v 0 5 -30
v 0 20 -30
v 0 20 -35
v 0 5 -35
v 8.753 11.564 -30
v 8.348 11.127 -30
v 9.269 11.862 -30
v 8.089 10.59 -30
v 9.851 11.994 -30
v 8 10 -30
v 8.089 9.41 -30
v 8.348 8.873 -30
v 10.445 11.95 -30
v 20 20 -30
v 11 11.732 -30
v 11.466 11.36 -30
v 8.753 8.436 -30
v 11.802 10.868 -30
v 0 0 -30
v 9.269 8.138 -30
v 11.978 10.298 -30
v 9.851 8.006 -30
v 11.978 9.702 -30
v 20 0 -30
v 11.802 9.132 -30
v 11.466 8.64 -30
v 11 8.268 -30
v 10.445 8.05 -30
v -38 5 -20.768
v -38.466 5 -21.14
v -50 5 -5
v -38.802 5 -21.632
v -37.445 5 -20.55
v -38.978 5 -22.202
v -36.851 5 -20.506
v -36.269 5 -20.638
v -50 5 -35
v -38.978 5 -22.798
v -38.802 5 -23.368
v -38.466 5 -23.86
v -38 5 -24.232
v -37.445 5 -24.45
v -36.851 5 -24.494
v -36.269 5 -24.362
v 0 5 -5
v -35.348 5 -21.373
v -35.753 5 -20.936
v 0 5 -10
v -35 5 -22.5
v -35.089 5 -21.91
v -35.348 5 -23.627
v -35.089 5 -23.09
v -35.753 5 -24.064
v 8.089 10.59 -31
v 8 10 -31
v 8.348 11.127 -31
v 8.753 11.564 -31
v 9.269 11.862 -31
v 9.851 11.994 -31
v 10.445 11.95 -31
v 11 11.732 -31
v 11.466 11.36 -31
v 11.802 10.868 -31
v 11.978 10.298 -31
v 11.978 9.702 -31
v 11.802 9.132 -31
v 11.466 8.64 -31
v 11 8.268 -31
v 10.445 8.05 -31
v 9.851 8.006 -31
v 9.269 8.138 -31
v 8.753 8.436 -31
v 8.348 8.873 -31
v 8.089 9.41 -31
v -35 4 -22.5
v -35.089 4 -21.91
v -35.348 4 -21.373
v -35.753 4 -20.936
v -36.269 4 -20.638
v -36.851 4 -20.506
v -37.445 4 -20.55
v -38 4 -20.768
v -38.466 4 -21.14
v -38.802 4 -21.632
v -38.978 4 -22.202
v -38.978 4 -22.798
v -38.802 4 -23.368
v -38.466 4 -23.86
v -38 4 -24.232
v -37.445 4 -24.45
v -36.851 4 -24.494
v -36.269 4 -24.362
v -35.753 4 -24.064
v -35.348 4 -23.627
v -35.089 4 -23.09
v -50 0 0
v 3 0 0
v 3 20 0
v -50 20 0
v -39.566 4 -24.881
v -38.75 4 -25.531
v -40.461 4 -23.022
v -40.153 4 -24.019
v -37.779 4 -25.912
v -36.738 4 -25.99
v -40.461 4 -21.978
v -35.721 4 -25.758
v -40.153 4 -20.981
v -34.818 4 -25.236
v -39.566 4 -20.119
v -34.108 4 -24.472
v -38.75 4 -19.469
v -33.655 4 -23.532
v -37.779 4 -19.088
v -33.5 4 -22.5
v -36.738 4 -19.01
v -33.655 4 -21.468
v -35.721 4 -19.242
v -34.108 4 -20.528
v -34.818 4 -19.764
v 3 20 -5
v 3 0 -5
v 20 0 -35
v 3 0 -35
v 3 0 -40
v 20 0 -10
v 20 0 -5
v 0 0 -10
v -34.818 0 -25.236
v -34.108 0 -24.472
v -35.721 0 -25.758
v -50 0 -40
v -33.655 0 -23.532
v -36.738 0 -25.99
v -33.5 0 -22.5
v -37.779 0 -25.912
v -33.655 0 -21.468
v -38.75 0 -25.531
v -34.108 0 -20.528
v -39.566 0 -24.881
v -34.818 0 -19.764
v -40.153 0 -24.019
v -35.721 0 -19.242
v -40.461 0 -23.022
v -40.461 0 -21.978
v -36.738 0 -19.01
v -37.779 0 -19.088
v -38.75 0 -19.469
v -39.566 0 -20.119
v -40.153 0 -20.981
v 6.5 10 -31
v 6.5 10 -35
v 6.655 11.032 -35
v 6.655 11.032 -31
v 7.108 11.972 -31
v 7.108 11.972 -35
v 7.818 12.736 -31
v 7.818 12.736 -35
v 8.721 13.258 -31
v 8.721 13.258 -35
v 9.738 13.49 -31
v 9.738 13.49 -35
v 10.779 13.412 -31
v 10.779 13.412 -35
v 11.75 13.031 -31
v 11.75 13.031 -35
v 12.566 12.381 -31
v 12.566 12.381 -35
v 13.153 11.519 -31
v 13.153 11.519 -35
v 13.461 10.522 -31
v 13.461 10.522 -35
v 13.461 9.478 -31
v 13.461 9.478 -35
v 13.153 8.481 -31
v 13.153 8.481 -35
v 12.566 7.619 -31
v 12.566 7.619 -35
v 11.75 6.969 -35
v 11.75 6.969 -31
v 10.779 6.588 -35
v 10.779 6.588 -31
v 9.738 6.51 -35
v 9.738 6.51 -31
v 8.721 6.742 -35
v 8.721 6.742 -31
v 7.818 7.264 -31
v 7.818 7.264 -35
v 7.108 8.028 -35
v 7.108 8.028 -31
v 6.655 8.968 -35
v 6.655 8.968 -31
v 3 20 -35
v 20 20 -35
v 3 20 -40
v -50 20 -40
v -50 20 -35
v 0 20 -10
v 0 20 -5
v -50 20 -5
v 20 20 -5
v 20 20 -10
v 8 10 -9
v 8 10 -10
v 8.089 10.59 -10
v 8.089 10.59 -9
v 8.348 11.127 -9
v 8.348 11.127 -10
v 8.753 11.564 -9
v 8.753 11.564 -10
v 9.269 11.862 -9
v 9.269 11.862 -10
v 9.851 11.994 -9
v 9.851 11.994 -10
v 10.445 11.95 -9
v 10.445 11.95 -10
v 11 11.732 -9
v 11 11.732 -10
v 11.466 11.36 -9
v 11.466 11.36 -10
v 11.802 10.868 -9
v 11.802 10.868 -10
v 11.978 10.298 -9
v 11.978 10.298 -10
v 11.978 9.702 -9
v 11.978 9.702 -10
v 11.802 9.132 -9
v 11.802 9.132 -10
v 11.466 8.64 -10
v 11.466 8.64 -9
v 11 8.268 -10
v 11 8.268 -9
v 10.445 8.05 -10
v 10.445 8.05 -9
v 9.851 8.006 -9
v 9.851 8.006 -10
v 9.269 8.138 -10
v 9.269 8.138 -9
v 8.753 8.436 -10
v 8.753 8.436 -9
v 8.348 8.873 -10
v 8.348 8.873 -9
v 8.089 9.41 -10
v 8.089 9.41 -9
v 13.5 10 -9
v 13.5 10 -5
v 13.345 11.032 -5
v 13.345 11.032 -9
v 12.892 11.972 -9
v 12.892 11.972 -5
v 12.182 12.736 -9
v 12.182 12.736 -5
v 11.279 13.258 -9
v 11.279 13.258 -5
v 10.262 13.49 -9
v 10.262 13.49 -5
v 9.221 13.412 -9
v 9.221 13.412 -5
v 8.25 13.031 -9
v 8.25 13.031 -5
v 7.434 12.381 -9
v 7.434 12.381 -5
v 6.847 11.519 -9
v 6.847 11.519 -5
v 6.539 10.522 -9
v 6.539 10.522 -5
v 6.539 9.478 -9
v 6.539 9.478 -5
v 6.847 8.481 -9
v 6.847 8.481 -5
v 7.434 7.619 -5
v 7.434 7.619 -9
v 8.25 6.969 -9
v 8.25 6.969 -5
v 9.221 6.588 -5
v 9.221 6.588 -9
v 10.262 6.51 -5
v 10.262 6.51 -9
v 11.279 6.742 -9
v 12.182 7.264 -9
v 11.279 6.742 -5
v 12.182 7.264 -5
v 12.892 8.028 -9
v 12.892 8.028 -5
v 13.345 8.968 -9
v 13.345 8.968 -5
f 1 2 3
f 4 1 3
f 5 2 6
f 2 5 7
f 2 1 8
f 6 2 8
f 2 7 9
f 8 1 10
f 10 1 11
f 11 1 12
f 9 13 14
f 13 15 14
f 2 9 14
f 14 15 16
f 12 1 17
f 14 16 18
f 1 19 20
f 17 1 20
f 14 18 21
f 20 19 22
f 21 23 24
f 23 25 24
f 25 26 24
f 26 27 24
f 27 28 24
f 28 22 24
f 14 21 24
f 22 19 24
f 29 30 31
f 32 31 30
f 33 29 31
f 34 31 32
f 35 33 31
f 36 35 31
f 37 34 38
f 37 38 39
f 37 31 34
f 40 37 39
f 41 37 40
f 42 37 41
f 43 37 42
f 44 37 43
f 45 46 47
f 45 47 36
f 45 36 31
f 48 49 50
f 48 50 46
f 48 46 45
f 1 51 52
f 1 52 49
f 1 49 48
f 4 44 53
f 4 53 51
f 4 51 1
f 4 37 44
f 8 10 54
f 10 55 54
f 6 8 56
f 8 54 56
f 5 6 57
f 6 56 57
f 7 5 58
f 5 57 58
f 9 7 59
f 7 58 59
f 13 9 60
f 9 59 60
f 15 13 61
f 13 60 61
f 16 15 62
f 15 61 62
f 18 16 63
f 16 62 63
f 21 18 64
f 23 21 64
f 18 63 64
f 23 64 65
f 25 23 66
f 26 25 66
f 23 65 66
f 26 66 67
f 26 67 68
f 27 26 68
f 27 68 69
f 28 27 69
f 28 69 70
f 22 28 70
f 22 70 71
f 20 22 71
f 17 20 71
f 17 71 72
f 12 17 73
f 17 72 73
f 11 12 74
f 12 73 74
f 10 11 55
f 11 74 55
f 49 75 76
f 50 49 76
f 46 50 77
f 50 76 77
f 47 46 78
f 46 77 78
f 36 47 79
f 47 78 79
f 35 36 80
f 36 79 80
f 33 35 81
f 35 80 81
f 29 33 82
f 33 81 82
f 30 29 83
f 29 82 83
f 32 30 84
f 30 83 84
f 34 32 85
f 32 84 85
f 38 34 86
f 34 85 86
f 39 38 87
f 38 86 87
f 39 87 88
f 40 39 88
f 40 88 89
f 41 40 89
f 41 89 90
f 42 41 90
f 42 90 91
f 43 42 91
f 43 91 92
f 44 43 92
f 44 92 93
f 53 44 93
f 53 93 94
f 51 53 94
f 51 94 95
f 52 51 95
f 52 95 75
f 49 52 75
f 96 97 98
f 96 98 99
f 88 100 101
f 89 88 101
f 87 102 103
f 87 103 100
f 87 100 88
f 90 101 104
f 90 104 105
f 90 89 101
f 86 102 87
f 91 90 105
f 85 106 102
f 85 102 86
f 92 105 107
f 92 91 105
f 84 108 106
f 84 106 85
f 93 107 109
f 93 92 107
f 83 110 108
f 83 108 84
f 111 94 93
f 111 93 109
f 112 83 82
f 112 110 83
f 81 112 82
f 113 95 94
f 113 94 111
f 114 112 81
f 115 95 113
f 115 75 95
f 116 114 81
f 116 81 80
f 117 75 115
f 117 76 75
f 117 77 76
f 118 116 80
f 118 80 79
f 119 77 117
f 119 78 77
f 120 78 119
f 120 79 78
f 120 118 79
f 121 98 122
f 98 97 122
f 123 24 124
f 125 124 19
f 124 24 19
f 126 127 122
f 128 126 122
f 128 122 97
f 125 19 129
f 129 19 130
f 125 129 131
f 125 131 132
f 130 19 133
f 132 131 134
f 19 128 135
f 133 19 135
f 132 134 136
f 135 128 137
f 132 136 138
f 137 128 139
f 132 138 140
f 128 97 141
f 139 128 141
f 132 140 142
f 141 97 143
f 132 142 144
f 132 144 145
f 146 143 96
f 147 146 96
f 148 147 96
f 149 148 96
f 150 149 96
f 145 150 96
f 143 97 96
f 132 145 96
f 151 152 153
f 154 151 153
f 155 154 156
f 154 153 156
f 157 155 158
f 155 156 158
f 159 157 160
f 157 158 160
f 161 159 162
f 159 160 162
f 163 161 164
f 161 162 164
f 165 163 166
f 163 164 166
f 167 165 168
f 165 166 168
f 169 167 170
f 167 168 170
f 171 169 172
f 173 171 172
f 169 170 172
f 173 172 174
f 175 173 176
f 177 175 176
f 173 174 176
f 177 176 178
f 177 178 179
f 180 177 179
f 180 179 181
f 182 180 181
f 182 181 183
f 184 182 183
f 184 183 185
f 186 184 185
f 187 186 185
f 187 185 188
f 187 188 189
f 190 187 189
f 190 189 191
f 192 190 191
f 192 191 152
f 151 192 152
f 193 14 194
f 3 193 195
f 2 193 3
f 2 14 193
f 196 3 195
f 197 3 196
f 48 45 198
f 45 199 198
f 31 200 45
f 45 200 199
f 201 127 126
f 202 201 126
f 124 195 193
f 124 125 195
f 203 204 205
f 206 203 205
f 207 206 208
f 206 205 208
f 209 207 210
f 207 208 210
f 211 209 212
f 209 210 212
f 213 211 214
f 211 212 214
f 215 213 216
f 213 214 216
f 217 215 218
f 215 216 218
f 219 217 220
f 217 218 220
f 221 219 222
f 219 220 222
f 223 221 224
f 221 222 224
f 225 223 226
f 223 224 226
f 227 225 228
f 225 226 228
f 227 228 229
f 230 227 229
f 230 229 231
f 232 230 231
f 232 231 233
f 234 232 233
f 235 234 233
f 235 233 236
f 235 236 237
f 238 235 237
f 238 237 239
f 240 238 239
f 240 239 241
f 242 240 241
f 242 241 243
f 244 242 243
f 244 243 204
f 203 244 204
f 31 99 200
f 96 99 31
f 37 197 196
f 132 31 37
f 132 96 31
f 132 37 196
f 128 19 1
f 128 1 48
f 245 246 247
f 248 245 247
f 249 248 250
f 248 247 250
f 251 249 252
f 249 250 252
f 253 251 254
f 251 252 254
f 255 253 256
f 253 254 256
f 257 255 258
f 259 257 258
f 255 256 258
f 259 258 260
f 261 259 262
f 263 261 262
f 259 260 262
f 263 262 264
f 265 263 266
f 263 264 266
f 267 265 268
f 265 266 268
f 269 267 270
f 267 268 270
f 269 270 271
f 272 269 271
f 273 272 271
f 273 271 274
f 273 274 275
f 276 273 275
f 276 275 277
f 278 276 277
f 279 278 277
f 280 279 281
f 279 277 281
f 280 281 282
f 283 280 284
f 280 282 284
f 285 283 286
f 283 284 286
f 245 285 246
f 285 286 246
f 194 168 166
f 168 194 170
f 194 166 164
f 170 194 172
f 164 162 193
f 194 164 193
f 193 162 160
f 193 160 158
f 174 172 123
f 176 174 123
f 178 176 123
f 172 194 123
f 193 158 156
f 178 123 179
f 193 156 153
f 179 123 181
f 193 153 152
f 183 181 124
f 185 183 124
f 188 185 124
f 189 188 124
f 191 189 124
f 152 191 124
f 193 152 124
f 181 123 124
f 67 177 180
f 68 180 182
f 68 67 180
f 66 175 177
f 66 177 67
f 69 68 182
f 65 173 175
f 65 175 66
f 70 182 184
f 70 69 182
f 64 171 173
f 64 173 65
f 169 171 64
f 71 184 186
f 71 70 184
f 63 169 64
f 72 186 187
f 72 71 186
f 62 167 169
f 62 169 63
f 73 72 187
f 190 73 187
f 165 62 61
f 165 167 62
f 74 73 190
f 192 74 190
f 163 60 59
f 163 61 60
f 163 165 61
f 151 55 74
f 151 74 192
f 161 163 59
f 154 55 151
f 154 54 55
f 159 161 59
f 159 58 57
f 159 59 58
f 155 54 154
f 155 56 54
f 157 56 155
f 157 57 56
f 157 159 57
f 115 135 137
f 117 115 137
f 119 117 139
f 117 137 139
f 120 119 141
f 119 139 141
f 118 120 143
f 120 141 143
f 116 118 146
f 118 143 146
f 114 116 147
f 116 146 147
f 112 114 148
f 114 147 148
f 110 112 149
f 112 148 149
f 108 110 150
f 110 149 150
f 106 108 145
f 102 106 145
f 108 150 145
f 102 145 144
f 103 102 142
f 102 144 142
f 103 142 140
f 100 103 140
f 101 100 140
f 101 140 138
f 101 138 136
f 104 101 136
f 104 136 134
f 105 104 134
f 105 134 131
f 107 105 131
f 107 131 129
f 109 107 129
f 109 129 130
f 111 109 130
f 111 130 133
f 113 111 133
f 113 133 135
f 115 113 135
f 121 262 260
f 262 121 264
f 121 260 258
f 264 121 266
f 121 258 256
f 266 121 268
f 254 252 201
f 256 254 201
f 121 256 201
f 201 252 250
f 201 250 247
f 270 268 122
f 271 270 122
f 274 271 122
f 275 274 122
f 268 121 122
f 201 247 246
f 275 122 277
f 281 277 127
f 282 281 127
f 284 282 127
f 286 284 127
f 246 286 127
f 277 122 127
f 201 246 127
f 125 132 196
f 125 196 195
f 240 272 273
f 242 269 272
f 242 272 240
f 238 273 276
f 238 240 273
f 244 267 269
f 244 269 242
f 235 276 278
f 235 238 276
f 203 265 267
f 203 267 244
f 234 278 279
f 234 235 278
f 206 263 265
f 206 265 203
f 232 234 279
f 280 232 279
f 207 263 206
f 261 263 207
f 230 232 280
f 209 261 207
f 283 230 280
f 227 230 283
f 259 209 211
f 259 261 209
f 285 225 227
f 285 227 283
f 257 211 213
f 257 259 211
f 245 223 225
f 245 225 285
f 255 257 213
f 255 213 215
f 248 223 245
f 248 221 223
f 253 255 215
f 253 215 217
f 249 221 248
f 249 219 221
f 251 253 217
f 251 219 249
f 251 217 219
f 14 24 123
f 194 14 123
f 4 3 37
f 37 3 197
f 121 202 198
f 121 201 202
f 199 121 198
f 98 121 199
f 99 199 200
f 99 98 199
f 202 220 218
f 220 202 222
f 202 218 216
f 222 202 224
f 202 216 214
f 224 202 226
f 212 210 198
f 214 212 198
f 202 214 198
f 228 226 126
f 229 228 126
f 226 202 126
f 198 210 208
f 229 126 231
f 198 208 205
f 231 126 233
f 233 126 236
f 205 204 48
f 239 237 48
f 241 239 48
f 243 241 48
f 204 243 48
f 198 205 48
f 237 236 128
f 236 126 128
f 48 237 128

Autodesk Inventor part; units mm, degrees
ref_plane "YZ Plane" through (0, 0, 0) normal (1, 0, 0) x (0, 1, 0)
ref_plane "XZ Plane" through (0, 0, 0) normal (0, 1, 0) x (-1, 0, 0)
ref_plane "XY Plane" through (0, 0, 0) normal (0, 0, 1) x (1, 0, 0)
sketch "Sketch1" plane through (0, 0, 0) normal (0, 1, 0) x (-1, 0, 0)
  line L0 (0, 0) -> (50, 0)
  line L1 (50, 0) -> (50, -40)
  line L2 (50, -40) -> (0, -40)
  line L3 (0, -40) -> (0, 0)
  line L4 (0, -5) -> (-20, -5)
  line L5 (-20, -5) -> (-20, -10)
  line L6 (-20, -10) -> (0, -10)
  line L7 (0, -10) -> (0, -5)
  line L8 (0, -30) -> (-20, -30)
  line L9 (-20, -30) -> (-20, -35)
  line L10 (-20, -35) -> (0, -35)
  line L11 (0, -35) -> (0, -30)
  line L12 (0, 0) -> (-3, 0)
  line L13 (-3, 0) -> (-3, -5)
  line L14 (-3, -5) -> (0, -5)
  line L15 (0, -5) -> (0, 0)
  line L16 (0, -40) -> (-3, -40)
  line L17 (-3, -40) -> (-3, -35)
  line L18 (-3, -35) -> (0, -35)
  line L19 (0, -35) -> (0, -40)
  line L20 (0, -10) -> (-3, -10)
  line L21 (-3, -10) -> (-3, -30)
  line L22 (-3, -30) -> (0, -30)
  line L23 (0, -30) -> (0, -10)
  point P0 (0, -10)
  dimension "d0" = 50
  dimension "d1" = 40
  dimension "d2" = 20
  dimension "d3" = 20
  dimension "d4" = 5
  dimension "d5" = 5
  dimension "d6" = 5
  dimension "d7" = 5
  dimension "d8" = 3
  dimension "d9" = 5
extrude "Extrusion1" add sketch "Sketch1" along normal blind 20 contours L0 L1 L2 L3 | L3 L4 L13 L12 | L3 L6 L5 L4 | L16 L17 L10 L3 | L3 L10 L9 L8
sketch "Sketch2" plane through (0, 20, 0) normal (0, 1, 0) x (1, 0, 0)
  line L0 (-50, 40) -> (-50, 0) projected
  line L1 (-50, 5) -> (0, 5)
  line L2 (0, 5) -> (0, 35)
  line L3 (0, 35) -> (-50, 35)
  line L4 (-50, 35) -> (-50, 5)
  line L5 (3, 40) -> (-50, 40) projected
  point P0 (0, 0)
  point P1 (-50, 35)
  dimension "d12" = 50
  dimension "d13" = 30
  dimension "d26" = 5
extrude "Extrusion2" cut sketch "Sketch2" against normal blind 15
sketch "Sketch3" plane through (3, 0, -5) normal (0, 0, 1) x (1, 0, 0)
  circle A0 centre (7, 10) radius 3.5
  line L0 (17, 0) -> (17, 20) projected
  line L1 (0, 20) -> (17, 20) projected
  point P0 (-3, 0)
  point P1 (8.5, 20)
  dimension "d16" = 10
  dimension "d17" = 10
  dimension "d20" = 7
extrude "Extrusion3" cut sketch "Sketch3" against normal blind 4
sketch "Sketch4" plane through (20, 0, -35) normal (0, 0, -1) x (-1, 0, 0)
  circle A0 centre (10, 10) radius 3.5 projected
  circle A1 centre (10, 10) radius 3.5 projected
  point P0 (20, 0)
extrude "Extrusion4" cut sketch "Sketch4" against normal blind 4
sketch "Sketch5" plane through (10, 10, -31) normal (0, 0, -1) x (-1, 0, 0)
  circle A0 centre (0, 0) radius 2
  point P0 (10, -10)
  dimension "d23" = 4
extrude "Extrusion5" cut sketch "Sketch5" against normal through all
sketch "Sketch6" plane through (0, 0, 0) normal (0, -1, 0) x (1, 0, 0)
  circle A0 centre (-37, -22.5) radius 3.5
  point P0 (0, 0)
  point P1 (-50, -5)
  point P2 (-50, -35)
  point P3 (0, -35)
  dimension "d27" = 7
  dimension "d28" = 12.5
  dimension "d29" = 37
extrude "Extrusion6" cut sketch "Sketch6" against normal blind 4
sketch "Sketch7" plane through (-37, 4, -22.5) normal (0, -1, 0) x (1, 0, 0)
  circle A0 centre (0, 0) radius 2
  point P0 (37, 22.5)
  dimension "d32" = 4
extrude "Extrusion7" cut sketch "Sketch7" against normal blind 4
properties part number "PowerSupplyAttach"
